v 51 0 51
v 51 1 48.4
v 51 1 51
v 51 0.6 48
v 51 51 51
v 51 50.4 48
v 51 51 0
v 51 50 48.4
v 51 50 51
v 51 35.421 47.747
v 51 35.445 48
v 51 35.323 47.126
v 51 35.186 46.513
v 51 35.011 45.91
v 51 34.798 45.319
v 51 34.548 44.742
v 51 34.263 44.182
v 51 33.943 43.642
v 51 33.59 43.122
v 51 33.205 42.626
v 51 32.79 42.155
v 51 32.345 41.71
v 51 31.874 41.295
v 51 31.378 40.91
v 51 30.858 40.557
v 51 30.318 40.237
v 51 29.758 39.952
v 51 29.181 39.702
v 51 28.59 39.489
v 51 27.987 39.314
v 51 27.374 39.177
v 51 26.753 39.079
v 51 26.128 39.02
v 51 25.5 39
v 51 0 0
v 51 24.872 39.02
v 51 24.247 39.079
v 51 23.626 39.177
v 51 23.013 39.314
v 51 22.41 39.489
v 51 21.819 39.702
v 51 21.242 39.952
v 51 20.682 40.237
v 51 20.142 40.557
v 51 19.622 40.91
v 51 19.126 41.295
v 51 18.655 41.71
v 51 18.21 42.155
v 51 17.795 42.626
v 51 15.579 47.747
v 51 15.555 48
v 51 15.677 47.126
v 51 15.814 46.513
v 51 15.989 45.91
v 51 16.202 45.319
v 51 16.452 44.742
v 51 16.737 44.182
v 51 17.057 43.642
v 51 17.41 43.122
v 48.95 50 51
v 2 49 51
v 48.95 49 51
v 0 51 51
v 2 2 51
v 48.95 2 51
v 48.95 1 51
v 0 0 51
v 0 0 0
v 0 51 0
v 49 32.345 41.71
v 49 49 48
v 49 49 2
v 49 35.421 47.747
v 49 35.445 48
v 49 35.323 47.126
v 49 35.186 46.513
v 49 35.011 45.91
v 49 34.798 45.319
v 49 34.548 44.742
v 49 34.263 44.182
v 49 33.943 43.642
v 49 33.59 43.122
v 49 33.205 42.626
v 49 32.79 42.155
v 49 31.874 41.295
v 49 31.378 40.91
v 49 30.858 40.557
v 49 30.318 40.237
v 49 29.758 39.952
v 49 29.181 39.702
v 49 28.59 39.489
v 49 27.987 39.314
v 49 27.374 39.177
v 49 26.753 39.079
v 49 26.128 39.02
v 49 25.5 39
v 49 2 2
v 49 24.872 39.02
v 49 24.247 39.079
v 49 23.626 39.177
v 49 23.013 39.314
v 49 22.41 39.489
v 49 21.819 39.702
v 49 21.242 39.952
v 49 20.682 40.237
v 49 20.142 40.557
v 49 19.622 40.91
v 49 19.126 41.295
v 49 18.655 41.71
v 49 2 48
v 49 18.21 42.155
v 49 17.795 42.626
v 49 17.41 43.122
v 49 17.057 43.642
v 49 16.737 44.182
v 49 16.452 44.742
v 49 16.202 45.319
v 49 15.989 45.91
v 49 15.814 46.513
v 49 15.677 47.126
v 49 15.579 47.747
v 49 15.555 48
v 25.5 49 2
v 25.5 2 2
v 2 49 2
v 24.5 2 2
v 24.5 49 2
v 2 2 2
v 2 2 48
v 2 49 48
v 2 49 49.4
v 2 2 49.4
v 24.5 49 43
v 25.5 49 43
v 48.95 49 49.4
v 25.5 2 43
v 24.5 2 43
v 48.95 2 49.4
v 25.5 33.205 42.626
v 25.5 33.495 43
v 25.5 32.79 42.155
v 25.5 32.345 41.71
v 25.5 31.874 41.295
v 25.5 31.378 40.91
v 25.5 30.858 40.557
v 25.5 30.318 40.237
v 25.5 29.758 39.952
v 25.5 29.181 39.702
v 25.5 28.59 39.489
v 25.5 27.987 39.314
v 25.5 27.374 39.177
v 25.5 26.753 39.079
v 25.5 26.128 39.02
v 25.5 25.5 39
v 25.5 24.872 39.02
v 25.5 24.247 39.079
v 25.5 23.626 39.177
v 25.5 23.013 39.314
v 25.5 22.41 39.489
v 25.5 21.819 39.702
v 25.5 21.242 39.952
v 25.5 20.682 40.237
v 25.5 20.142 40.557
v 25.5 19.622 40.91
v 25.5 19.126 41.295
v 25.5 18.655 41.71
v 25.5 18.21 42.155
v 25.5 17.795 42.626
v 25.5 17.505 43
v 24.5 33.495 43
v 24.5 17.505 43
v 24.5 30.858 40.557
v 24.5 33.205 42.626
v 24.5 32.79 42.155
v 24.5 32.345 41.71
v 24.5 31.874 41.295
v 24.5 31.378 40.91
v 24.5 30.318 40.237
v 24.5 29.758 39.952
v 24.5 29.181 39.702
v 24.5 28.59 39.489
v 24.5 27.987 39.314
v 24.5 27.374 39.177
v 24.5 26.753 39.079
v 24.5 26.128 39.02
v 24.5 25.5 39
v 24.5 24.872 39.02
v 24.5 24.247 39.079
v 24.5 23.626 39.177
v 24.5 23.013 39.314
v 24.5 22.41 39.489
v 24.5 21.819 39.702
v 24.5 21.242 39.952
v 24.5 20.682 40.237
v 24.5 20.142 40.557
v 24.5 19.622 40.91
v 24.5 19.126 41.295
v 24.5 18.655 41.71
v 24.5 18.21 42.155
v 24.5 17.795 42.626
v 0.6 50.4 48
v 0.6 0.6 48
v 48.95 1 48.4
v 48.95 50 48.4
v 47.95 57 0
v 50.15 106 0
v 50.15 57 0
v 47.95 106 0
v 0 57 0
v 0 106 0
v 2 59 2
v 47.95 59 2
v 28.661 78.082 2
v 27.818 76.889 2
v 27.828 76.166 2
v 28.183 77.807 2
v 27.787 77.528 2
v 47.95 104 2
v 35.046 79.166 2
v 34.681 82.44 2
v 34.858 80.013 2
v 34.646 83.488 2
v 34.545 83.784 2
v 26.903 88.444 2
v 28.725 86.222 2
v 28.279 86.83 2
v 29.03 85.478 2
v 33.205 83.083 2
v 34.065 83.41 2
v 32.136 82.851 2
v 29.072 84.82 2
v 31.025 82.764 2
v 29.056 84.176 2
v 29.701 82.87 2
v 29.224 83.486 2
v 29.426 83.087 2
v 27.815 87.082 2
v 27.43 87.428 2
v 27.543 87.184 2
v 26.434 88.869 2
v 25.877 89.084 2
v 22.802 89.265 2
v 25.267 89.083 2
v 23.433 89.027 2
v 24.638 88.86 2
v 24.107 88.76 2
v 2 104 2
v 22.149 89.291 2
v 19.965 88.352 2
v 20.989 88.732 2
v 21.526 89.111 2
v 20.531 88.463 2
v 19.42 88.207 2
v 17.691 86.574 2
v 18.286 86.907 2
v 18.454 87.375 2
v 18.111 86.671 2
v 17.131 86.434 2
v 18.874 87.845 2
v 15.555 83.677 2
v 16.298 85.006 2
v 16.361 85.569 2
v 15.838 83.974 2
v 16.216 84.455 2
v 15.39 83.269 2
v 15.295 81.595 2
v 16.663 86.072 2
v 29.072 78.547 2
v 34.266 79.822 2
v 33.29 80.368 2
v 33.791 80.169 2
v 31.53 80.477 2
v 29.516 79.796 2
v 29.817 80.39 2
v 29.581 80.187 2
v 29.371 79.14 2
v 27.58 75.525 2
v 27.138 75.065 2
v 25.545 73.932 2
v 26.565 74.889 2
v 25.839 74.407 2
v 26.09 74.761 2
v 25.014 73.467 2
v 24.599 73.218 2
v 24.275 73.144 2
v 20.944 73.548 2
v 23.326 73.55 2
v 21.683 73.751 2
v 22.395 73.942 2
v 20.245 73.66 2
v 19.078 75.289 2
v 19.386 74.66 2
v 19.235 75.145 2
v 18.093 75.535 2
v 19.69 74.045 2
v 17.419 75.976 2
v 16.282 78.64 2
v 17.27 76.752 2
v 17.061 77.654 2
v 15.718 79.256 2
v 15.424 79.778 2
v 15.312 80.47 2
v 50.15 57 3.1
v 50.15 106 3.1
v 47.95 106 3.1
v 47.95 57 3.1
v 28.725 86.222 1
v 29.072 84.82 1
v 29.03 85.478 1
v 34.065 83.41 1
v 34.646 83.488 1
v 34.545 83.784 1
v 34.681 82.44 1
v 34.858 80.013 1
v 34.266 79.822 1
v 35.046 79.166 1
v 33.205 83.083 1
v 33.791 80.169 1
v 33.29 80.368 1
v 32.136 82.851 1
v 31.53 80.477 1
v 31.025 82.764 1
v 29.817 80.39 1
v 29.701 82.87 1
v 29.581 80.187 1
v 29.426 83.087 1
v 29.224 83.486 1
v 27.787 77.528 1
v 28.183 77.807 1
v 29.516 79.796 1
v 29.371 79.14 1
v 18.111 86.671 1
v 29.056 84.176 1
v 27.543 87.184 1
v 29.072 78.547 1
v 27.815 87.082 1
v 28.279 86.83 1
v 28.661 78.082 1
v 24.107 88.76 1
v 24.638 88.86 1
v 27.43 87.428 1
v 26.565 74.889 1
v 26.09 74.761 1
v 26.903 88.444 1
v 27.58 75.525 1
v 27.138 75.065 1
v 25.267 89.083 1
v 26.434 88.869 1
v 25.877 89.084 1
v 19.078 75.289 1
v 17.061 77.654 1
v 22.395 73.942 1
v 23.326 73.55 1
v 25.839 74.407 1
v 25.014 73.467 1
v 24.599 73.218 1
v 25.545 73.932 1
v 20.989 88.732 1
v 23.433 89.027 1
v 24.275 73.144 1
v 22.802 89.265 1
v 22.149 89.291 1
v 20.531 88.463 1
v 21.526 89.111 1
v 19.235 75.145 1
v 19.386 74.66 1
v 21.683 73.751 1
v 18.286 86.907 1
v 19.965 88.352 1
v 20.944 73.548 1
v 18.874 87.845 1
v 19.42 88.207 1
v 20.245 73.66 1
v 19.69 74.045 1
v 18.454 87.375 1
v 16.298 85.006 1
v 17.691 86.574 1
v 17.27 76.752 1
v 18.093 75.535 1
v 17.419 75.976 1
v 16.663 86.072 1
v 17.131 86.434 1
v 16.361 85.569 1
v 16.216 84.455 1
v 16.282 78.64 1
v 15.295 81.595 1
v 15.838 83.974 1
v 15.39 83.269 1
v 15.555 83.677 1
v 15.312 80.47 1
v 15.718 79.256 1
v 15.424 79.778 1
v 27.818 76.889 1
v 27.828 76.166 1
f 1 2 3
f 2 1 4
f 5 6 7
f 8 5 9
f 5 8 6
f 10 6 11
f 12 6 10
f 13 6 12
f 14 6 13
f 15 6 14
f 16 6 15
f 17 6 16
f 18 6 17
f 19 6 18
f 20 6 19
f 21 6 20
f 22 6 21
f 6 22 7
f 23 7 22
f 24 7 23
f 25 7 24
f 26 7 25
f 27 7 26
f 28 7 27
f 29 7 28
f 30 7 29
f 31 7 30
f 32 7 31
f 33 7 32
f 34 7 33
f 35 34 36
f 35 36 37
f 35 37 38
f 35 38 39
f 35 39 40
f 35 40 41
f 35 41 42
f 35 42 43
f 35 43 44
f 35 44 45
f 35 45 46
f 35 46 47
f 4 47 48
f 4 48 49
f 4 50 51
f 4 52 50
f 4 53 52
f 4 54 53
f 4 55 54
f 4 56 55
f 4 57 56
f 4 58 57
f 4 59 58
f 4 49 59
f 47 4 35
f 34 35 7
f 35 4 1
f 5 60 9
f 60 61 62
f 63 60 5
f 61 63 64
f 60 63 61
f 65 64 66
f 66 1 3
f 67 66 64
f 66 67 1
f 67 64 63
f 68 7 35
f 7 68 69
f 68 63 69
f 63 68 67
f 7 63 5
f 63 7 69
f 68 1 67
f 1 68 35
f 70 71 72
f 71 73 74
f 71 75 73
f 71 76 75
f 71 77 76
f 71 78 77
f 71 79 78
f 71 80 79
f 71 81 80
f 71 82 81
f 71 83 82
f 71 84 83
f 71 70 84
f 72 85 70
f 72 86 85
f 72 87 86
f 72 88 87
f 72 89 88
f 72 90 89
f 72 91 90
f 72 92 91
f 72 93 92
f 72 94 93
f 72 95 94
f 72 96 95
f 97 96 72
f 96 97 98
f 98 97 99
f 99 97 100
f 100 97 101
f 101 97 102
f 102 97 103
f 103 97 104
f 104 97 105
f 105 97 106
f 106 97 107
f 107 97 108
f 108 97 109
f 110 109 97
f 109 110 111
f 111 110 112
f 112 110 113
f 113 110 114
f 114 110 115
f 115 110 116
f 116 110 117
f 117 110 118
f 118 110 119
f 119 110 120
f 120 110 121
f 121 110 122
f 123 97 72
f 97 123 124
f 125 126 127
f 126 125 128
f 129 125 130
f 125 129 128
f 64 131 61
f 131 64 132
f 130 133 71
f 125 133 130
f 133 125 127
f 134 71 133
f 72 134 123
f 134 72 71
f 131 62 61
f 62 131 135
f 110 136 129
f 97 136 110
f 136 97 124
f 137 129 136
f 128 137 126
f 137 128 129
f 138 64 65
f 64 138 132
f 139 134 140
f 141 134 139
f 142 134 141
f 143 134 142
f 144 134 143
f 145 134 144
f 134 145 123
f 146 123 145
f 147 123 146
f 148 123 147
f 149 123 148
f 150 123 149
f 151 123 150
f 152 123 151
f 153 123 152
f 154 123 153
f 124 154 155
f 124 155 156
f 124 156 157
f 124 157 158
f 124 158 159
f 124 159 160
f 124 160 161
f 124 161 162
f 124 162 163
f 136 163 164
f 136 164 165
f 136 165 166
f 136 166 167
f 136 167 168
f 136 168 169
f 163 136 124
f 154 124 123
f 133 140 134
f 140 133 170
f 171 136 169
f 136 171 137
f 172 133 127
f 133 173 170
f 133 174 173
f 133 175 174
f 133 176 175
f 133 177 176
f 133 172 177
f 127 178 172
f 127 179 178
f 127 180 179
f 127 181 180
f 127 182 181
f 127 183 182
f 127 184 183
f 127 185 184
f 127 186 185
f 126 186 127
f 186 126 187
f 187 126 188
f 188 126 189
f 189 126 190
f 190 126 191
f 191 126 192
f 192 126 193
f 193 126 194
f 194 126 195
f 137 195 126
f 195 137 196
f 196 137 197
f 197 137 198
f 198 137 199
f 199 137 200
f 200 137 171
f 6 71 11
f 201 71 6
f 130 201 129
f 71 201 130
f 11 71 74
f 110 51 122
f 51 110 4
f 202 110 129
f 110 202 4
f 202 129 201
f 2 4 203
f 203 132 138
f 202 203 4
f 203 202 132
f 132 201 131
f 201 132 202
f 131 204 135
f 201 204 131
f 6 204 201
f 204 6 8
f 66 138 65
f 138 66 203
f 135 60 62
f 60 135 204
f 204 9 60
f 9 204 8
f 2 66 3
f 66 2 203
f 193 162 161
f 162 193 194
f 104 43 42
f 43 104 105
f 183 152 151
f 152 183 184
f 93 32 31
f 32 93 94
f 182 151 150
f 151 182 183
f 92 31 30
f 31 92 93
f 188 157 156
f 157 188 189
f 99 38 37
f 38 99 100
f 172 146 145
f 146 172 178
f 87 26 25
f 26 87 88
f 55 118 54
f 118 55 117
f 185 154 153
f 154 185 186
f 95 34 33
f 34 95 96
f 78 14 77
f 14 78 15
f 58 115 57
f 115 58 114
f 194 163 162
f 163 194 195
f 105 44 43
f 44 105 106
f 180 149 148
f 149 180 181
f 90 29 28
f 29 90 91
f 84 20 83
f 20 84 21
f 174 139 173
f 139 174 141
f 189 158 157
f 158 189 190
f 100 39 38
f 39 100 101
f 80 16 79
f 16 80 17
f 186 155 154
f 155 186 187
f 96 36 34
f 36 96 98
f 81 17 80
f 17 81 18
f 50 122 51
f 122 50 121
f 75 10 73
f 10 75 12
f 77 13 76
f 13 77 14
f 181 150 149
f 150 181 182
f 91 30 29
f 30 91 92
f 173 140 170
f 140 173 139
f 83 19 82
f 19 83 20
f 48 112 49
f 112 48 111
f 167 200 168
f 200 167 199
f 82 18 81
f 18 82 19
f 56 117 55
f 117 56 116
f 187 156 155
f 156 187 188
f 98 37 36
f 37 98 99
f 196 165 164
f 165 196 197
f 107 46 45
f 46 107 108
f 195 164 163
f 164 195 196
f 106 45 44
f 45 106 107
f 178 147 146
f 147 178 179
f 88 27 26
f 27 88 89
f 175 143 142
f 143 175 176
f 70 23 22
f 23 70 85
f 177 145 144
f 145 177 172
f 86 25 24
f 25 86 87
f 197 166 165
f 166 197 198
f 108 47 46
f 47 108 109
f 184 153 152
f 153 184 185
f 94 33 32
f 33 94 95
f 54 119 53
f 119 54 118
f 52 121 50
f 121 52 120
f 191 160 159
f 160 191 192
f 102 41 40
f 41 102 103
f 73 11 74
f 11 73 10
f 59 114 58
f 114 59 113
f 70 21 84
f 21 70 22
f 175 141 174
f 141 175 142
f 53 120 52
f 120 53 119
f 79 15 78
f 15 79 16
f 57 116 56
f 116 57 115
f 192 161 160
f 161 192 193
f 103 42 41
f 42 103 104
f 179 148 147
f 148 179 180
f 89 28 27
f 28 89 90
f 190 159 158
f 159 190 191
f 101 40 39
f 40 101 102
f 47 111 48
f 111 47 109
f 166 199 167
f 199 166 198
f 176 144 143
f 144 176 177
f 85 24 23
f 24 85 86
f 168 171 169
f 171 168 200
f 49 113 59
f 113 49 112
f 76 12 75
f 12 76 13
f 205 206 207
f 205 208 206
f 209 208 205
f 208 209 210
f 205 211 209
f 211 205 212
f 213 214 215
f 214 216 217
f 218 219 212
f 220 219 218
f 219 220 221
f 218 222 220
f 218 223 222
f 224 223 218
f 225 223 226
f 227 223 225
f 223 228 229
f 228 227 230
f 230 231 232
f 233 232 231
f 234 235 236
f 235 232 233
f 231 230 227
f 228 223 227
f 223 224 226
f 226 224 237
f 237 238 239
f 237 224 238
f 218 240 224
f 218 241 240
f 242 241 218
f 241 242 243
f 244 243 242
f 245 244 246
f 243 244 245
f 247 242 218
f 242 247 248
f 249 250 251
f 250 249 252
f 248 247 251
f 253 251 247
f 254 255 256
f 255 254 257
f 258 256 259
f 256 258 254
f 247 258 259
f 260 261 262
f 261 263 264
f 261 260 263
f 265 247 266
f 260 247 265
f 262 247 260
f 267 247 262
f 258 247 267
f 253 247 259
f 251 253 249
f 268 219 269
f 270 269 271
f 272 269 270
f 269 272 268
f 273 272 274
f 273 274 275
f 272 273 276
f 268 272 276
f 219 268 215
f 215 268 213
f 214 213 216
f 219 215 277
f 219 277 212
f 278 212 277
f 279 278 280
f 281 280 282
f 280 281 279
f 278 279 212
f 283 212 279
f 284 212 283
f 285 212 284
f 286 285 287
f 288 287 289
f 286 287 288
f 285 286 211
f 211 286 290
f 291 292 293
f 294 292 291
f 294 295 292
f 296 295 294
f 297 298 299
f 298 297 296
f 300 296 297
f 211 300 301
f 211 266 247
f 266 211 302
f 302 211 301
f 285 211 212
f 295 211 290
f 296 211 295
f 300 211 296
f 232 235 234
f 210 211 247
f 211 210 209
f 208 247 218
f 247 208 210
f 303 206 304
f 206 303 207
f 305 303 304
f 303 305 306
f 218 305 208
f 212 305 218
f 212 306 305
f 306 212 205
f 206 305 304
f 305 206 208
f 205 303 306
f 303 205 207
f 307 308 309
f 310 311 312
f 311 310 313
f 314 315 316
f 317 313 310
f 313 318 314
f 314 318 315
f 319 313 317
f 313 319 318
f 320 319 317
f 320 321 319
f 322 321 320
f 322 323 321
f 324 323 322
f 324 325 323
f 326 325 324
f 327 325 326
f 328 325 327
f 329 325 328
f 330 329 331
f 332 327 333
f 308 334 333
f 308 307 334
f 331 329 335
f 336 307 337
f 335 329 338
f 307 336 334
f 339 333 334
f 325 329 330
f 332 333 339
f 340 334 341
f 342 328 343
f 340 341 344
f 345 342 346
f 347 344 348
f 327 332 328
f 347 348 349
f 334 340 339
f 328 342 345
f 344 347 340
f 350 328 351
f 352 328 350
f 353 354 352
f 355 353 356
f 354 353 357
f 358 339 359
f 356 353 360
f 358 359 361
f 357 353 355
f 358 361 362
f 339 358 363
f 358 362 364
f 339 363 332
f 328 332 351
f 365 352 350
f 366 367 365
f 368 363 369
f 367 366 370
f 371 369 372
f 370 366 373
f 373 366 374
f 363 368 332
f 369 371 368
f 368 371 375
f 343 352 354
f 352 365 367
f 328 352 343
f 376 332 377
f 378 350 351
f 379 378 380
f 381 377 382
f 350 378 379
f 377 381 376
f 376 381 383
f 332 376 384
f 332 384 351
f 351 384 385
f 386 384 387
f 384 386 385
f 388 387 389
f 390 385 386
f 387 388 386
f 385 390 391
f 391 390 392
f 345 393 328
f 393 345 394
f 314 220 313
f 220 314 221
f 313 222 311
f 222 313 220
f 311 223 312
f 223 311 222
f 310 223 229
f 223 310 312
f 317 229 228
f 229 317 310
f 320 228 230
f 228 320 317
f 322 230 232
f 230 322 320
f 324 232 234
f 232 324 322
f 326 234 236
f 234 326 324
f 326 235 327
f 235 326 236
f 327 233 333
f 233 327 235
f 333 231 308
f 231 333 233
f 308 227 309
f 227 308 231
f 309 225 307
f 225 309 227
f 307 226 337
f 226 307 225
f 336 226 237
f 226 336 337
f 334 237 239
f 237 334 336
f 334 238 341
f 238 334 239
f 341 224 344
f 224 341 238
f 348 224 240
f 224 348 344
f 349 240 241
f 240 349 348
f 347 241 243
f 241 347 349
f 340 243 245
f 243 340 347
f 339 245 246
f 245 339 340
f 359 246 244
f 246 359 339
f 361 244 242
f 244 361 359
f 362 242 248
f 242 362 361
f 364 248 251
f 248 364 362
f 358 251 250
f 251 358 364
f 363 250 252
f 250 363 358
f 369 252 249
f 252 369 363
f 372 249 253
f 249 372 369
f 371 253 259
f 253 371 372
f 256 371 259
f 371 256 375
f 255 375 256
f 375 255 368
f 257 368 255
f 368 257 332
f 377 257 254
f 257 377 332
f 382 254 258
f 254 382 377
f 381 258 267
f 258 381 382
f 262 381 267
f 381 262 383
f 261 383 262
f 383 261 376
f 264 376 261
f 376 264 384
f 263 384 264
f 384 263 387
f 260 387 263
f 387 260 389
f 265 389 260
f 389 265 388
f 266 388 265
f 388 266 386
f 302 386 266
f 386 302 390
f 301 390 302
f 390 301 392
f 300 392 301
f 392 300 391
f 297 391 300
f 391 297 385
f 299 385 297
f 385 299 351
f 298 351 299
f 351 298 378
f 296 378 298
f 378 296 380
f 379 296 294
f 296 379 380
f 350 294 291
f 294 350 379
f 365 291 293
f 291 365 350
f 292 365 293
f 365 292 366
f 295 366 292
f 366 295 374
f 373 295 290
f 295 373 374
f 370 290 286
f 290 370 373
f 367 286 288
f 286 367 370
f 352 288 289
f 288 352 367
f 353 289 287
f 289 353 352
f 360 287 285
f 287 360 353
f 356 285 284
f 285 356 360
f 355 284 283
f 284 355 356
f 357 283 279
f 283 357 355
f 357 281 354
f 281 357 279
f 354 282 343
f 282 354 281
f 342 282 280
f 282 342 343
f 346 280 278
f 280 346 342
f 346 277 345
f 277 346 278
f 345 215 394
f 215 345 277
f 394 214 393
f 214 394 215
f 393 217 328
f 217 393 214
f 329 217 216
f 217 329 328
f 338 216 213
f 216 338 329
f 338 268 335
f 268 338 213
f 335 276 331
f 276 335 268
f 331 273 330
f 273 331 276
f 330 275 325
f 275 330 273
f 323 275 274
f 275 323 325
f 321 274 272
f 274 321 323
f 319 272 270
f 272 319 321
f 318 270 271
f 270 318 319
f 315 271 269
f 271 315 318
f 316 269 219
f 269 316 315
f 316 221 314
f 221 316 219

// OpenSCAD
// file: carcassonne_box.scad
/**
 * @file carcassonne_box.scad
 * @author Conlan Wesson
 * Template for Carcossonne boxes.
 * @copyright Creative Commons Attribution-NonCommercial-ShareAlike 4.0
 */

mm = 1;
cm = 10*mm;

width = 47*mm;
thick = 2.5*mm;
wall = 2*mm;

/**
 * Lid for box.
 * @param count Number of cards.
 * @param columns Number of columns.
 * @param icon Path to icon DXF file.
 * @param rot Icon rotation in degrees.
 * @param mult Icon scale.
 * @param xoff X-offset of icon from center.
 * @param yoff Y-offset of icon from center.
 */
module carcassonne_lid(count, columns=1, icon=false, rot=0, mult=1, xoff=0, yoff=0, g=0){
	length = (thick * count) + ((width/2) - ((thick * count) % (width/2)));
	w = length+(1.5*wall)+.1;
	l = (width*columns)+wall;
	h = wall;
	d = 2;

	CubePoints = [
		[ 0-g, 0-g,   0 ],  //0
		[ w+g, 0-g,   0 ],  //1
		[ w+g, l+g,   0 ],  //2
		[ 0-g, l+g,   0 ],  //3
		[   d,   d, h+g ],  //4
		[   w,   d, h+g ],  //5
		[   w, l-d, h+g ],  //6
		[   d, l-d, h+g ]   //7
	];
	
	CubeFaces = [
		[0,1,2,3],  // bottom
		[4,5,1,0],  // front
		[7,6,5,4],  // top
		[5,6,2,1],  // right
		[6,7,3,2],  // back
		[7,4,0,3]   // left
	];
	
	
	difference(){
		union(){
			polyhedron( CubePoints, CubeFaces );
			translate([w-wall-.15,0,0]) cube([wall+.2,l, (1.5*wall)+.1]);
		}
		if(icon){
			translate([w/2+xoff,l/3+yoff,h-(wall/2)]){
				linear_extrude(height=(wall)+.1){
					rotate(rot) scale(mult) import(icon);
				}
			}
		}
	}
}

/**
 * Carcassonne card box.
 * @param count Number of cards.
 * @param dividers Array of divider positions.
 * @param columns Number of columns.
 */
module carcassonne_box(count, dividers=[], columns=1){
	length = (thick * count) + ((width/2) - ((thick * count) % (width/2)));
	difference(){
		union(){
			difference(){
				// Outer walls
				cube([length+(2*wall), (width*columns)+(2*wall), width+(2*wall)]);
				// Cavity
				translate([wall, wall, wall]){
					cube([length, width*columns, (width+wall)+.1]);
				}
			}
			// Dividers
			for(col = [0:columns-1]){
				for(div = dividers[col]){
					translate([(div*(width/2))+(wall/2), width*col+wall, 0]) cube([wall/2, width, width-(2*wall)]);
				}
				if(col > 0){
					translate([0, width*col+(wall/2), 0]) cube([length+(2*wall), wall/2, width-(2*wall)]);
				}
			}
		}
		union(){
			// Notch
			for(col = [0:columns-1]){
				translate([wall, wall+(width*col), wall]){
					translate([0, width/2, width])
					rotate([0, 90, 0]){
						cylinder(r=10, h=length+(2*wall), $fn=100);
					}
				}
			}
			// Track
			translate([wall/2,wall/2,width+wall/2]) carcassonne_lid(count, columns, g=0.4);
		}
	}
}
// main file
/**
 * @file fruitbearingtrees.scad
 * @author Conlan Wesson
 * Fruit-Bearing Trees Carcossonne box.
 * @copyright Creative Commons Attribution-NonCommercial-ShareAlike 4.0
 */

include <carcassonne_box.scad>

count = 10;
dividers = [1];
columns = 1;

carcassonne_box(count, dividers, columns);
translate([0,width*columns+10,0]) carcassonne_lid(count, columns, icon="fruitbearingtrees.dxf", rot=90, mult=0.9, xoff=10, yoff=-2);
